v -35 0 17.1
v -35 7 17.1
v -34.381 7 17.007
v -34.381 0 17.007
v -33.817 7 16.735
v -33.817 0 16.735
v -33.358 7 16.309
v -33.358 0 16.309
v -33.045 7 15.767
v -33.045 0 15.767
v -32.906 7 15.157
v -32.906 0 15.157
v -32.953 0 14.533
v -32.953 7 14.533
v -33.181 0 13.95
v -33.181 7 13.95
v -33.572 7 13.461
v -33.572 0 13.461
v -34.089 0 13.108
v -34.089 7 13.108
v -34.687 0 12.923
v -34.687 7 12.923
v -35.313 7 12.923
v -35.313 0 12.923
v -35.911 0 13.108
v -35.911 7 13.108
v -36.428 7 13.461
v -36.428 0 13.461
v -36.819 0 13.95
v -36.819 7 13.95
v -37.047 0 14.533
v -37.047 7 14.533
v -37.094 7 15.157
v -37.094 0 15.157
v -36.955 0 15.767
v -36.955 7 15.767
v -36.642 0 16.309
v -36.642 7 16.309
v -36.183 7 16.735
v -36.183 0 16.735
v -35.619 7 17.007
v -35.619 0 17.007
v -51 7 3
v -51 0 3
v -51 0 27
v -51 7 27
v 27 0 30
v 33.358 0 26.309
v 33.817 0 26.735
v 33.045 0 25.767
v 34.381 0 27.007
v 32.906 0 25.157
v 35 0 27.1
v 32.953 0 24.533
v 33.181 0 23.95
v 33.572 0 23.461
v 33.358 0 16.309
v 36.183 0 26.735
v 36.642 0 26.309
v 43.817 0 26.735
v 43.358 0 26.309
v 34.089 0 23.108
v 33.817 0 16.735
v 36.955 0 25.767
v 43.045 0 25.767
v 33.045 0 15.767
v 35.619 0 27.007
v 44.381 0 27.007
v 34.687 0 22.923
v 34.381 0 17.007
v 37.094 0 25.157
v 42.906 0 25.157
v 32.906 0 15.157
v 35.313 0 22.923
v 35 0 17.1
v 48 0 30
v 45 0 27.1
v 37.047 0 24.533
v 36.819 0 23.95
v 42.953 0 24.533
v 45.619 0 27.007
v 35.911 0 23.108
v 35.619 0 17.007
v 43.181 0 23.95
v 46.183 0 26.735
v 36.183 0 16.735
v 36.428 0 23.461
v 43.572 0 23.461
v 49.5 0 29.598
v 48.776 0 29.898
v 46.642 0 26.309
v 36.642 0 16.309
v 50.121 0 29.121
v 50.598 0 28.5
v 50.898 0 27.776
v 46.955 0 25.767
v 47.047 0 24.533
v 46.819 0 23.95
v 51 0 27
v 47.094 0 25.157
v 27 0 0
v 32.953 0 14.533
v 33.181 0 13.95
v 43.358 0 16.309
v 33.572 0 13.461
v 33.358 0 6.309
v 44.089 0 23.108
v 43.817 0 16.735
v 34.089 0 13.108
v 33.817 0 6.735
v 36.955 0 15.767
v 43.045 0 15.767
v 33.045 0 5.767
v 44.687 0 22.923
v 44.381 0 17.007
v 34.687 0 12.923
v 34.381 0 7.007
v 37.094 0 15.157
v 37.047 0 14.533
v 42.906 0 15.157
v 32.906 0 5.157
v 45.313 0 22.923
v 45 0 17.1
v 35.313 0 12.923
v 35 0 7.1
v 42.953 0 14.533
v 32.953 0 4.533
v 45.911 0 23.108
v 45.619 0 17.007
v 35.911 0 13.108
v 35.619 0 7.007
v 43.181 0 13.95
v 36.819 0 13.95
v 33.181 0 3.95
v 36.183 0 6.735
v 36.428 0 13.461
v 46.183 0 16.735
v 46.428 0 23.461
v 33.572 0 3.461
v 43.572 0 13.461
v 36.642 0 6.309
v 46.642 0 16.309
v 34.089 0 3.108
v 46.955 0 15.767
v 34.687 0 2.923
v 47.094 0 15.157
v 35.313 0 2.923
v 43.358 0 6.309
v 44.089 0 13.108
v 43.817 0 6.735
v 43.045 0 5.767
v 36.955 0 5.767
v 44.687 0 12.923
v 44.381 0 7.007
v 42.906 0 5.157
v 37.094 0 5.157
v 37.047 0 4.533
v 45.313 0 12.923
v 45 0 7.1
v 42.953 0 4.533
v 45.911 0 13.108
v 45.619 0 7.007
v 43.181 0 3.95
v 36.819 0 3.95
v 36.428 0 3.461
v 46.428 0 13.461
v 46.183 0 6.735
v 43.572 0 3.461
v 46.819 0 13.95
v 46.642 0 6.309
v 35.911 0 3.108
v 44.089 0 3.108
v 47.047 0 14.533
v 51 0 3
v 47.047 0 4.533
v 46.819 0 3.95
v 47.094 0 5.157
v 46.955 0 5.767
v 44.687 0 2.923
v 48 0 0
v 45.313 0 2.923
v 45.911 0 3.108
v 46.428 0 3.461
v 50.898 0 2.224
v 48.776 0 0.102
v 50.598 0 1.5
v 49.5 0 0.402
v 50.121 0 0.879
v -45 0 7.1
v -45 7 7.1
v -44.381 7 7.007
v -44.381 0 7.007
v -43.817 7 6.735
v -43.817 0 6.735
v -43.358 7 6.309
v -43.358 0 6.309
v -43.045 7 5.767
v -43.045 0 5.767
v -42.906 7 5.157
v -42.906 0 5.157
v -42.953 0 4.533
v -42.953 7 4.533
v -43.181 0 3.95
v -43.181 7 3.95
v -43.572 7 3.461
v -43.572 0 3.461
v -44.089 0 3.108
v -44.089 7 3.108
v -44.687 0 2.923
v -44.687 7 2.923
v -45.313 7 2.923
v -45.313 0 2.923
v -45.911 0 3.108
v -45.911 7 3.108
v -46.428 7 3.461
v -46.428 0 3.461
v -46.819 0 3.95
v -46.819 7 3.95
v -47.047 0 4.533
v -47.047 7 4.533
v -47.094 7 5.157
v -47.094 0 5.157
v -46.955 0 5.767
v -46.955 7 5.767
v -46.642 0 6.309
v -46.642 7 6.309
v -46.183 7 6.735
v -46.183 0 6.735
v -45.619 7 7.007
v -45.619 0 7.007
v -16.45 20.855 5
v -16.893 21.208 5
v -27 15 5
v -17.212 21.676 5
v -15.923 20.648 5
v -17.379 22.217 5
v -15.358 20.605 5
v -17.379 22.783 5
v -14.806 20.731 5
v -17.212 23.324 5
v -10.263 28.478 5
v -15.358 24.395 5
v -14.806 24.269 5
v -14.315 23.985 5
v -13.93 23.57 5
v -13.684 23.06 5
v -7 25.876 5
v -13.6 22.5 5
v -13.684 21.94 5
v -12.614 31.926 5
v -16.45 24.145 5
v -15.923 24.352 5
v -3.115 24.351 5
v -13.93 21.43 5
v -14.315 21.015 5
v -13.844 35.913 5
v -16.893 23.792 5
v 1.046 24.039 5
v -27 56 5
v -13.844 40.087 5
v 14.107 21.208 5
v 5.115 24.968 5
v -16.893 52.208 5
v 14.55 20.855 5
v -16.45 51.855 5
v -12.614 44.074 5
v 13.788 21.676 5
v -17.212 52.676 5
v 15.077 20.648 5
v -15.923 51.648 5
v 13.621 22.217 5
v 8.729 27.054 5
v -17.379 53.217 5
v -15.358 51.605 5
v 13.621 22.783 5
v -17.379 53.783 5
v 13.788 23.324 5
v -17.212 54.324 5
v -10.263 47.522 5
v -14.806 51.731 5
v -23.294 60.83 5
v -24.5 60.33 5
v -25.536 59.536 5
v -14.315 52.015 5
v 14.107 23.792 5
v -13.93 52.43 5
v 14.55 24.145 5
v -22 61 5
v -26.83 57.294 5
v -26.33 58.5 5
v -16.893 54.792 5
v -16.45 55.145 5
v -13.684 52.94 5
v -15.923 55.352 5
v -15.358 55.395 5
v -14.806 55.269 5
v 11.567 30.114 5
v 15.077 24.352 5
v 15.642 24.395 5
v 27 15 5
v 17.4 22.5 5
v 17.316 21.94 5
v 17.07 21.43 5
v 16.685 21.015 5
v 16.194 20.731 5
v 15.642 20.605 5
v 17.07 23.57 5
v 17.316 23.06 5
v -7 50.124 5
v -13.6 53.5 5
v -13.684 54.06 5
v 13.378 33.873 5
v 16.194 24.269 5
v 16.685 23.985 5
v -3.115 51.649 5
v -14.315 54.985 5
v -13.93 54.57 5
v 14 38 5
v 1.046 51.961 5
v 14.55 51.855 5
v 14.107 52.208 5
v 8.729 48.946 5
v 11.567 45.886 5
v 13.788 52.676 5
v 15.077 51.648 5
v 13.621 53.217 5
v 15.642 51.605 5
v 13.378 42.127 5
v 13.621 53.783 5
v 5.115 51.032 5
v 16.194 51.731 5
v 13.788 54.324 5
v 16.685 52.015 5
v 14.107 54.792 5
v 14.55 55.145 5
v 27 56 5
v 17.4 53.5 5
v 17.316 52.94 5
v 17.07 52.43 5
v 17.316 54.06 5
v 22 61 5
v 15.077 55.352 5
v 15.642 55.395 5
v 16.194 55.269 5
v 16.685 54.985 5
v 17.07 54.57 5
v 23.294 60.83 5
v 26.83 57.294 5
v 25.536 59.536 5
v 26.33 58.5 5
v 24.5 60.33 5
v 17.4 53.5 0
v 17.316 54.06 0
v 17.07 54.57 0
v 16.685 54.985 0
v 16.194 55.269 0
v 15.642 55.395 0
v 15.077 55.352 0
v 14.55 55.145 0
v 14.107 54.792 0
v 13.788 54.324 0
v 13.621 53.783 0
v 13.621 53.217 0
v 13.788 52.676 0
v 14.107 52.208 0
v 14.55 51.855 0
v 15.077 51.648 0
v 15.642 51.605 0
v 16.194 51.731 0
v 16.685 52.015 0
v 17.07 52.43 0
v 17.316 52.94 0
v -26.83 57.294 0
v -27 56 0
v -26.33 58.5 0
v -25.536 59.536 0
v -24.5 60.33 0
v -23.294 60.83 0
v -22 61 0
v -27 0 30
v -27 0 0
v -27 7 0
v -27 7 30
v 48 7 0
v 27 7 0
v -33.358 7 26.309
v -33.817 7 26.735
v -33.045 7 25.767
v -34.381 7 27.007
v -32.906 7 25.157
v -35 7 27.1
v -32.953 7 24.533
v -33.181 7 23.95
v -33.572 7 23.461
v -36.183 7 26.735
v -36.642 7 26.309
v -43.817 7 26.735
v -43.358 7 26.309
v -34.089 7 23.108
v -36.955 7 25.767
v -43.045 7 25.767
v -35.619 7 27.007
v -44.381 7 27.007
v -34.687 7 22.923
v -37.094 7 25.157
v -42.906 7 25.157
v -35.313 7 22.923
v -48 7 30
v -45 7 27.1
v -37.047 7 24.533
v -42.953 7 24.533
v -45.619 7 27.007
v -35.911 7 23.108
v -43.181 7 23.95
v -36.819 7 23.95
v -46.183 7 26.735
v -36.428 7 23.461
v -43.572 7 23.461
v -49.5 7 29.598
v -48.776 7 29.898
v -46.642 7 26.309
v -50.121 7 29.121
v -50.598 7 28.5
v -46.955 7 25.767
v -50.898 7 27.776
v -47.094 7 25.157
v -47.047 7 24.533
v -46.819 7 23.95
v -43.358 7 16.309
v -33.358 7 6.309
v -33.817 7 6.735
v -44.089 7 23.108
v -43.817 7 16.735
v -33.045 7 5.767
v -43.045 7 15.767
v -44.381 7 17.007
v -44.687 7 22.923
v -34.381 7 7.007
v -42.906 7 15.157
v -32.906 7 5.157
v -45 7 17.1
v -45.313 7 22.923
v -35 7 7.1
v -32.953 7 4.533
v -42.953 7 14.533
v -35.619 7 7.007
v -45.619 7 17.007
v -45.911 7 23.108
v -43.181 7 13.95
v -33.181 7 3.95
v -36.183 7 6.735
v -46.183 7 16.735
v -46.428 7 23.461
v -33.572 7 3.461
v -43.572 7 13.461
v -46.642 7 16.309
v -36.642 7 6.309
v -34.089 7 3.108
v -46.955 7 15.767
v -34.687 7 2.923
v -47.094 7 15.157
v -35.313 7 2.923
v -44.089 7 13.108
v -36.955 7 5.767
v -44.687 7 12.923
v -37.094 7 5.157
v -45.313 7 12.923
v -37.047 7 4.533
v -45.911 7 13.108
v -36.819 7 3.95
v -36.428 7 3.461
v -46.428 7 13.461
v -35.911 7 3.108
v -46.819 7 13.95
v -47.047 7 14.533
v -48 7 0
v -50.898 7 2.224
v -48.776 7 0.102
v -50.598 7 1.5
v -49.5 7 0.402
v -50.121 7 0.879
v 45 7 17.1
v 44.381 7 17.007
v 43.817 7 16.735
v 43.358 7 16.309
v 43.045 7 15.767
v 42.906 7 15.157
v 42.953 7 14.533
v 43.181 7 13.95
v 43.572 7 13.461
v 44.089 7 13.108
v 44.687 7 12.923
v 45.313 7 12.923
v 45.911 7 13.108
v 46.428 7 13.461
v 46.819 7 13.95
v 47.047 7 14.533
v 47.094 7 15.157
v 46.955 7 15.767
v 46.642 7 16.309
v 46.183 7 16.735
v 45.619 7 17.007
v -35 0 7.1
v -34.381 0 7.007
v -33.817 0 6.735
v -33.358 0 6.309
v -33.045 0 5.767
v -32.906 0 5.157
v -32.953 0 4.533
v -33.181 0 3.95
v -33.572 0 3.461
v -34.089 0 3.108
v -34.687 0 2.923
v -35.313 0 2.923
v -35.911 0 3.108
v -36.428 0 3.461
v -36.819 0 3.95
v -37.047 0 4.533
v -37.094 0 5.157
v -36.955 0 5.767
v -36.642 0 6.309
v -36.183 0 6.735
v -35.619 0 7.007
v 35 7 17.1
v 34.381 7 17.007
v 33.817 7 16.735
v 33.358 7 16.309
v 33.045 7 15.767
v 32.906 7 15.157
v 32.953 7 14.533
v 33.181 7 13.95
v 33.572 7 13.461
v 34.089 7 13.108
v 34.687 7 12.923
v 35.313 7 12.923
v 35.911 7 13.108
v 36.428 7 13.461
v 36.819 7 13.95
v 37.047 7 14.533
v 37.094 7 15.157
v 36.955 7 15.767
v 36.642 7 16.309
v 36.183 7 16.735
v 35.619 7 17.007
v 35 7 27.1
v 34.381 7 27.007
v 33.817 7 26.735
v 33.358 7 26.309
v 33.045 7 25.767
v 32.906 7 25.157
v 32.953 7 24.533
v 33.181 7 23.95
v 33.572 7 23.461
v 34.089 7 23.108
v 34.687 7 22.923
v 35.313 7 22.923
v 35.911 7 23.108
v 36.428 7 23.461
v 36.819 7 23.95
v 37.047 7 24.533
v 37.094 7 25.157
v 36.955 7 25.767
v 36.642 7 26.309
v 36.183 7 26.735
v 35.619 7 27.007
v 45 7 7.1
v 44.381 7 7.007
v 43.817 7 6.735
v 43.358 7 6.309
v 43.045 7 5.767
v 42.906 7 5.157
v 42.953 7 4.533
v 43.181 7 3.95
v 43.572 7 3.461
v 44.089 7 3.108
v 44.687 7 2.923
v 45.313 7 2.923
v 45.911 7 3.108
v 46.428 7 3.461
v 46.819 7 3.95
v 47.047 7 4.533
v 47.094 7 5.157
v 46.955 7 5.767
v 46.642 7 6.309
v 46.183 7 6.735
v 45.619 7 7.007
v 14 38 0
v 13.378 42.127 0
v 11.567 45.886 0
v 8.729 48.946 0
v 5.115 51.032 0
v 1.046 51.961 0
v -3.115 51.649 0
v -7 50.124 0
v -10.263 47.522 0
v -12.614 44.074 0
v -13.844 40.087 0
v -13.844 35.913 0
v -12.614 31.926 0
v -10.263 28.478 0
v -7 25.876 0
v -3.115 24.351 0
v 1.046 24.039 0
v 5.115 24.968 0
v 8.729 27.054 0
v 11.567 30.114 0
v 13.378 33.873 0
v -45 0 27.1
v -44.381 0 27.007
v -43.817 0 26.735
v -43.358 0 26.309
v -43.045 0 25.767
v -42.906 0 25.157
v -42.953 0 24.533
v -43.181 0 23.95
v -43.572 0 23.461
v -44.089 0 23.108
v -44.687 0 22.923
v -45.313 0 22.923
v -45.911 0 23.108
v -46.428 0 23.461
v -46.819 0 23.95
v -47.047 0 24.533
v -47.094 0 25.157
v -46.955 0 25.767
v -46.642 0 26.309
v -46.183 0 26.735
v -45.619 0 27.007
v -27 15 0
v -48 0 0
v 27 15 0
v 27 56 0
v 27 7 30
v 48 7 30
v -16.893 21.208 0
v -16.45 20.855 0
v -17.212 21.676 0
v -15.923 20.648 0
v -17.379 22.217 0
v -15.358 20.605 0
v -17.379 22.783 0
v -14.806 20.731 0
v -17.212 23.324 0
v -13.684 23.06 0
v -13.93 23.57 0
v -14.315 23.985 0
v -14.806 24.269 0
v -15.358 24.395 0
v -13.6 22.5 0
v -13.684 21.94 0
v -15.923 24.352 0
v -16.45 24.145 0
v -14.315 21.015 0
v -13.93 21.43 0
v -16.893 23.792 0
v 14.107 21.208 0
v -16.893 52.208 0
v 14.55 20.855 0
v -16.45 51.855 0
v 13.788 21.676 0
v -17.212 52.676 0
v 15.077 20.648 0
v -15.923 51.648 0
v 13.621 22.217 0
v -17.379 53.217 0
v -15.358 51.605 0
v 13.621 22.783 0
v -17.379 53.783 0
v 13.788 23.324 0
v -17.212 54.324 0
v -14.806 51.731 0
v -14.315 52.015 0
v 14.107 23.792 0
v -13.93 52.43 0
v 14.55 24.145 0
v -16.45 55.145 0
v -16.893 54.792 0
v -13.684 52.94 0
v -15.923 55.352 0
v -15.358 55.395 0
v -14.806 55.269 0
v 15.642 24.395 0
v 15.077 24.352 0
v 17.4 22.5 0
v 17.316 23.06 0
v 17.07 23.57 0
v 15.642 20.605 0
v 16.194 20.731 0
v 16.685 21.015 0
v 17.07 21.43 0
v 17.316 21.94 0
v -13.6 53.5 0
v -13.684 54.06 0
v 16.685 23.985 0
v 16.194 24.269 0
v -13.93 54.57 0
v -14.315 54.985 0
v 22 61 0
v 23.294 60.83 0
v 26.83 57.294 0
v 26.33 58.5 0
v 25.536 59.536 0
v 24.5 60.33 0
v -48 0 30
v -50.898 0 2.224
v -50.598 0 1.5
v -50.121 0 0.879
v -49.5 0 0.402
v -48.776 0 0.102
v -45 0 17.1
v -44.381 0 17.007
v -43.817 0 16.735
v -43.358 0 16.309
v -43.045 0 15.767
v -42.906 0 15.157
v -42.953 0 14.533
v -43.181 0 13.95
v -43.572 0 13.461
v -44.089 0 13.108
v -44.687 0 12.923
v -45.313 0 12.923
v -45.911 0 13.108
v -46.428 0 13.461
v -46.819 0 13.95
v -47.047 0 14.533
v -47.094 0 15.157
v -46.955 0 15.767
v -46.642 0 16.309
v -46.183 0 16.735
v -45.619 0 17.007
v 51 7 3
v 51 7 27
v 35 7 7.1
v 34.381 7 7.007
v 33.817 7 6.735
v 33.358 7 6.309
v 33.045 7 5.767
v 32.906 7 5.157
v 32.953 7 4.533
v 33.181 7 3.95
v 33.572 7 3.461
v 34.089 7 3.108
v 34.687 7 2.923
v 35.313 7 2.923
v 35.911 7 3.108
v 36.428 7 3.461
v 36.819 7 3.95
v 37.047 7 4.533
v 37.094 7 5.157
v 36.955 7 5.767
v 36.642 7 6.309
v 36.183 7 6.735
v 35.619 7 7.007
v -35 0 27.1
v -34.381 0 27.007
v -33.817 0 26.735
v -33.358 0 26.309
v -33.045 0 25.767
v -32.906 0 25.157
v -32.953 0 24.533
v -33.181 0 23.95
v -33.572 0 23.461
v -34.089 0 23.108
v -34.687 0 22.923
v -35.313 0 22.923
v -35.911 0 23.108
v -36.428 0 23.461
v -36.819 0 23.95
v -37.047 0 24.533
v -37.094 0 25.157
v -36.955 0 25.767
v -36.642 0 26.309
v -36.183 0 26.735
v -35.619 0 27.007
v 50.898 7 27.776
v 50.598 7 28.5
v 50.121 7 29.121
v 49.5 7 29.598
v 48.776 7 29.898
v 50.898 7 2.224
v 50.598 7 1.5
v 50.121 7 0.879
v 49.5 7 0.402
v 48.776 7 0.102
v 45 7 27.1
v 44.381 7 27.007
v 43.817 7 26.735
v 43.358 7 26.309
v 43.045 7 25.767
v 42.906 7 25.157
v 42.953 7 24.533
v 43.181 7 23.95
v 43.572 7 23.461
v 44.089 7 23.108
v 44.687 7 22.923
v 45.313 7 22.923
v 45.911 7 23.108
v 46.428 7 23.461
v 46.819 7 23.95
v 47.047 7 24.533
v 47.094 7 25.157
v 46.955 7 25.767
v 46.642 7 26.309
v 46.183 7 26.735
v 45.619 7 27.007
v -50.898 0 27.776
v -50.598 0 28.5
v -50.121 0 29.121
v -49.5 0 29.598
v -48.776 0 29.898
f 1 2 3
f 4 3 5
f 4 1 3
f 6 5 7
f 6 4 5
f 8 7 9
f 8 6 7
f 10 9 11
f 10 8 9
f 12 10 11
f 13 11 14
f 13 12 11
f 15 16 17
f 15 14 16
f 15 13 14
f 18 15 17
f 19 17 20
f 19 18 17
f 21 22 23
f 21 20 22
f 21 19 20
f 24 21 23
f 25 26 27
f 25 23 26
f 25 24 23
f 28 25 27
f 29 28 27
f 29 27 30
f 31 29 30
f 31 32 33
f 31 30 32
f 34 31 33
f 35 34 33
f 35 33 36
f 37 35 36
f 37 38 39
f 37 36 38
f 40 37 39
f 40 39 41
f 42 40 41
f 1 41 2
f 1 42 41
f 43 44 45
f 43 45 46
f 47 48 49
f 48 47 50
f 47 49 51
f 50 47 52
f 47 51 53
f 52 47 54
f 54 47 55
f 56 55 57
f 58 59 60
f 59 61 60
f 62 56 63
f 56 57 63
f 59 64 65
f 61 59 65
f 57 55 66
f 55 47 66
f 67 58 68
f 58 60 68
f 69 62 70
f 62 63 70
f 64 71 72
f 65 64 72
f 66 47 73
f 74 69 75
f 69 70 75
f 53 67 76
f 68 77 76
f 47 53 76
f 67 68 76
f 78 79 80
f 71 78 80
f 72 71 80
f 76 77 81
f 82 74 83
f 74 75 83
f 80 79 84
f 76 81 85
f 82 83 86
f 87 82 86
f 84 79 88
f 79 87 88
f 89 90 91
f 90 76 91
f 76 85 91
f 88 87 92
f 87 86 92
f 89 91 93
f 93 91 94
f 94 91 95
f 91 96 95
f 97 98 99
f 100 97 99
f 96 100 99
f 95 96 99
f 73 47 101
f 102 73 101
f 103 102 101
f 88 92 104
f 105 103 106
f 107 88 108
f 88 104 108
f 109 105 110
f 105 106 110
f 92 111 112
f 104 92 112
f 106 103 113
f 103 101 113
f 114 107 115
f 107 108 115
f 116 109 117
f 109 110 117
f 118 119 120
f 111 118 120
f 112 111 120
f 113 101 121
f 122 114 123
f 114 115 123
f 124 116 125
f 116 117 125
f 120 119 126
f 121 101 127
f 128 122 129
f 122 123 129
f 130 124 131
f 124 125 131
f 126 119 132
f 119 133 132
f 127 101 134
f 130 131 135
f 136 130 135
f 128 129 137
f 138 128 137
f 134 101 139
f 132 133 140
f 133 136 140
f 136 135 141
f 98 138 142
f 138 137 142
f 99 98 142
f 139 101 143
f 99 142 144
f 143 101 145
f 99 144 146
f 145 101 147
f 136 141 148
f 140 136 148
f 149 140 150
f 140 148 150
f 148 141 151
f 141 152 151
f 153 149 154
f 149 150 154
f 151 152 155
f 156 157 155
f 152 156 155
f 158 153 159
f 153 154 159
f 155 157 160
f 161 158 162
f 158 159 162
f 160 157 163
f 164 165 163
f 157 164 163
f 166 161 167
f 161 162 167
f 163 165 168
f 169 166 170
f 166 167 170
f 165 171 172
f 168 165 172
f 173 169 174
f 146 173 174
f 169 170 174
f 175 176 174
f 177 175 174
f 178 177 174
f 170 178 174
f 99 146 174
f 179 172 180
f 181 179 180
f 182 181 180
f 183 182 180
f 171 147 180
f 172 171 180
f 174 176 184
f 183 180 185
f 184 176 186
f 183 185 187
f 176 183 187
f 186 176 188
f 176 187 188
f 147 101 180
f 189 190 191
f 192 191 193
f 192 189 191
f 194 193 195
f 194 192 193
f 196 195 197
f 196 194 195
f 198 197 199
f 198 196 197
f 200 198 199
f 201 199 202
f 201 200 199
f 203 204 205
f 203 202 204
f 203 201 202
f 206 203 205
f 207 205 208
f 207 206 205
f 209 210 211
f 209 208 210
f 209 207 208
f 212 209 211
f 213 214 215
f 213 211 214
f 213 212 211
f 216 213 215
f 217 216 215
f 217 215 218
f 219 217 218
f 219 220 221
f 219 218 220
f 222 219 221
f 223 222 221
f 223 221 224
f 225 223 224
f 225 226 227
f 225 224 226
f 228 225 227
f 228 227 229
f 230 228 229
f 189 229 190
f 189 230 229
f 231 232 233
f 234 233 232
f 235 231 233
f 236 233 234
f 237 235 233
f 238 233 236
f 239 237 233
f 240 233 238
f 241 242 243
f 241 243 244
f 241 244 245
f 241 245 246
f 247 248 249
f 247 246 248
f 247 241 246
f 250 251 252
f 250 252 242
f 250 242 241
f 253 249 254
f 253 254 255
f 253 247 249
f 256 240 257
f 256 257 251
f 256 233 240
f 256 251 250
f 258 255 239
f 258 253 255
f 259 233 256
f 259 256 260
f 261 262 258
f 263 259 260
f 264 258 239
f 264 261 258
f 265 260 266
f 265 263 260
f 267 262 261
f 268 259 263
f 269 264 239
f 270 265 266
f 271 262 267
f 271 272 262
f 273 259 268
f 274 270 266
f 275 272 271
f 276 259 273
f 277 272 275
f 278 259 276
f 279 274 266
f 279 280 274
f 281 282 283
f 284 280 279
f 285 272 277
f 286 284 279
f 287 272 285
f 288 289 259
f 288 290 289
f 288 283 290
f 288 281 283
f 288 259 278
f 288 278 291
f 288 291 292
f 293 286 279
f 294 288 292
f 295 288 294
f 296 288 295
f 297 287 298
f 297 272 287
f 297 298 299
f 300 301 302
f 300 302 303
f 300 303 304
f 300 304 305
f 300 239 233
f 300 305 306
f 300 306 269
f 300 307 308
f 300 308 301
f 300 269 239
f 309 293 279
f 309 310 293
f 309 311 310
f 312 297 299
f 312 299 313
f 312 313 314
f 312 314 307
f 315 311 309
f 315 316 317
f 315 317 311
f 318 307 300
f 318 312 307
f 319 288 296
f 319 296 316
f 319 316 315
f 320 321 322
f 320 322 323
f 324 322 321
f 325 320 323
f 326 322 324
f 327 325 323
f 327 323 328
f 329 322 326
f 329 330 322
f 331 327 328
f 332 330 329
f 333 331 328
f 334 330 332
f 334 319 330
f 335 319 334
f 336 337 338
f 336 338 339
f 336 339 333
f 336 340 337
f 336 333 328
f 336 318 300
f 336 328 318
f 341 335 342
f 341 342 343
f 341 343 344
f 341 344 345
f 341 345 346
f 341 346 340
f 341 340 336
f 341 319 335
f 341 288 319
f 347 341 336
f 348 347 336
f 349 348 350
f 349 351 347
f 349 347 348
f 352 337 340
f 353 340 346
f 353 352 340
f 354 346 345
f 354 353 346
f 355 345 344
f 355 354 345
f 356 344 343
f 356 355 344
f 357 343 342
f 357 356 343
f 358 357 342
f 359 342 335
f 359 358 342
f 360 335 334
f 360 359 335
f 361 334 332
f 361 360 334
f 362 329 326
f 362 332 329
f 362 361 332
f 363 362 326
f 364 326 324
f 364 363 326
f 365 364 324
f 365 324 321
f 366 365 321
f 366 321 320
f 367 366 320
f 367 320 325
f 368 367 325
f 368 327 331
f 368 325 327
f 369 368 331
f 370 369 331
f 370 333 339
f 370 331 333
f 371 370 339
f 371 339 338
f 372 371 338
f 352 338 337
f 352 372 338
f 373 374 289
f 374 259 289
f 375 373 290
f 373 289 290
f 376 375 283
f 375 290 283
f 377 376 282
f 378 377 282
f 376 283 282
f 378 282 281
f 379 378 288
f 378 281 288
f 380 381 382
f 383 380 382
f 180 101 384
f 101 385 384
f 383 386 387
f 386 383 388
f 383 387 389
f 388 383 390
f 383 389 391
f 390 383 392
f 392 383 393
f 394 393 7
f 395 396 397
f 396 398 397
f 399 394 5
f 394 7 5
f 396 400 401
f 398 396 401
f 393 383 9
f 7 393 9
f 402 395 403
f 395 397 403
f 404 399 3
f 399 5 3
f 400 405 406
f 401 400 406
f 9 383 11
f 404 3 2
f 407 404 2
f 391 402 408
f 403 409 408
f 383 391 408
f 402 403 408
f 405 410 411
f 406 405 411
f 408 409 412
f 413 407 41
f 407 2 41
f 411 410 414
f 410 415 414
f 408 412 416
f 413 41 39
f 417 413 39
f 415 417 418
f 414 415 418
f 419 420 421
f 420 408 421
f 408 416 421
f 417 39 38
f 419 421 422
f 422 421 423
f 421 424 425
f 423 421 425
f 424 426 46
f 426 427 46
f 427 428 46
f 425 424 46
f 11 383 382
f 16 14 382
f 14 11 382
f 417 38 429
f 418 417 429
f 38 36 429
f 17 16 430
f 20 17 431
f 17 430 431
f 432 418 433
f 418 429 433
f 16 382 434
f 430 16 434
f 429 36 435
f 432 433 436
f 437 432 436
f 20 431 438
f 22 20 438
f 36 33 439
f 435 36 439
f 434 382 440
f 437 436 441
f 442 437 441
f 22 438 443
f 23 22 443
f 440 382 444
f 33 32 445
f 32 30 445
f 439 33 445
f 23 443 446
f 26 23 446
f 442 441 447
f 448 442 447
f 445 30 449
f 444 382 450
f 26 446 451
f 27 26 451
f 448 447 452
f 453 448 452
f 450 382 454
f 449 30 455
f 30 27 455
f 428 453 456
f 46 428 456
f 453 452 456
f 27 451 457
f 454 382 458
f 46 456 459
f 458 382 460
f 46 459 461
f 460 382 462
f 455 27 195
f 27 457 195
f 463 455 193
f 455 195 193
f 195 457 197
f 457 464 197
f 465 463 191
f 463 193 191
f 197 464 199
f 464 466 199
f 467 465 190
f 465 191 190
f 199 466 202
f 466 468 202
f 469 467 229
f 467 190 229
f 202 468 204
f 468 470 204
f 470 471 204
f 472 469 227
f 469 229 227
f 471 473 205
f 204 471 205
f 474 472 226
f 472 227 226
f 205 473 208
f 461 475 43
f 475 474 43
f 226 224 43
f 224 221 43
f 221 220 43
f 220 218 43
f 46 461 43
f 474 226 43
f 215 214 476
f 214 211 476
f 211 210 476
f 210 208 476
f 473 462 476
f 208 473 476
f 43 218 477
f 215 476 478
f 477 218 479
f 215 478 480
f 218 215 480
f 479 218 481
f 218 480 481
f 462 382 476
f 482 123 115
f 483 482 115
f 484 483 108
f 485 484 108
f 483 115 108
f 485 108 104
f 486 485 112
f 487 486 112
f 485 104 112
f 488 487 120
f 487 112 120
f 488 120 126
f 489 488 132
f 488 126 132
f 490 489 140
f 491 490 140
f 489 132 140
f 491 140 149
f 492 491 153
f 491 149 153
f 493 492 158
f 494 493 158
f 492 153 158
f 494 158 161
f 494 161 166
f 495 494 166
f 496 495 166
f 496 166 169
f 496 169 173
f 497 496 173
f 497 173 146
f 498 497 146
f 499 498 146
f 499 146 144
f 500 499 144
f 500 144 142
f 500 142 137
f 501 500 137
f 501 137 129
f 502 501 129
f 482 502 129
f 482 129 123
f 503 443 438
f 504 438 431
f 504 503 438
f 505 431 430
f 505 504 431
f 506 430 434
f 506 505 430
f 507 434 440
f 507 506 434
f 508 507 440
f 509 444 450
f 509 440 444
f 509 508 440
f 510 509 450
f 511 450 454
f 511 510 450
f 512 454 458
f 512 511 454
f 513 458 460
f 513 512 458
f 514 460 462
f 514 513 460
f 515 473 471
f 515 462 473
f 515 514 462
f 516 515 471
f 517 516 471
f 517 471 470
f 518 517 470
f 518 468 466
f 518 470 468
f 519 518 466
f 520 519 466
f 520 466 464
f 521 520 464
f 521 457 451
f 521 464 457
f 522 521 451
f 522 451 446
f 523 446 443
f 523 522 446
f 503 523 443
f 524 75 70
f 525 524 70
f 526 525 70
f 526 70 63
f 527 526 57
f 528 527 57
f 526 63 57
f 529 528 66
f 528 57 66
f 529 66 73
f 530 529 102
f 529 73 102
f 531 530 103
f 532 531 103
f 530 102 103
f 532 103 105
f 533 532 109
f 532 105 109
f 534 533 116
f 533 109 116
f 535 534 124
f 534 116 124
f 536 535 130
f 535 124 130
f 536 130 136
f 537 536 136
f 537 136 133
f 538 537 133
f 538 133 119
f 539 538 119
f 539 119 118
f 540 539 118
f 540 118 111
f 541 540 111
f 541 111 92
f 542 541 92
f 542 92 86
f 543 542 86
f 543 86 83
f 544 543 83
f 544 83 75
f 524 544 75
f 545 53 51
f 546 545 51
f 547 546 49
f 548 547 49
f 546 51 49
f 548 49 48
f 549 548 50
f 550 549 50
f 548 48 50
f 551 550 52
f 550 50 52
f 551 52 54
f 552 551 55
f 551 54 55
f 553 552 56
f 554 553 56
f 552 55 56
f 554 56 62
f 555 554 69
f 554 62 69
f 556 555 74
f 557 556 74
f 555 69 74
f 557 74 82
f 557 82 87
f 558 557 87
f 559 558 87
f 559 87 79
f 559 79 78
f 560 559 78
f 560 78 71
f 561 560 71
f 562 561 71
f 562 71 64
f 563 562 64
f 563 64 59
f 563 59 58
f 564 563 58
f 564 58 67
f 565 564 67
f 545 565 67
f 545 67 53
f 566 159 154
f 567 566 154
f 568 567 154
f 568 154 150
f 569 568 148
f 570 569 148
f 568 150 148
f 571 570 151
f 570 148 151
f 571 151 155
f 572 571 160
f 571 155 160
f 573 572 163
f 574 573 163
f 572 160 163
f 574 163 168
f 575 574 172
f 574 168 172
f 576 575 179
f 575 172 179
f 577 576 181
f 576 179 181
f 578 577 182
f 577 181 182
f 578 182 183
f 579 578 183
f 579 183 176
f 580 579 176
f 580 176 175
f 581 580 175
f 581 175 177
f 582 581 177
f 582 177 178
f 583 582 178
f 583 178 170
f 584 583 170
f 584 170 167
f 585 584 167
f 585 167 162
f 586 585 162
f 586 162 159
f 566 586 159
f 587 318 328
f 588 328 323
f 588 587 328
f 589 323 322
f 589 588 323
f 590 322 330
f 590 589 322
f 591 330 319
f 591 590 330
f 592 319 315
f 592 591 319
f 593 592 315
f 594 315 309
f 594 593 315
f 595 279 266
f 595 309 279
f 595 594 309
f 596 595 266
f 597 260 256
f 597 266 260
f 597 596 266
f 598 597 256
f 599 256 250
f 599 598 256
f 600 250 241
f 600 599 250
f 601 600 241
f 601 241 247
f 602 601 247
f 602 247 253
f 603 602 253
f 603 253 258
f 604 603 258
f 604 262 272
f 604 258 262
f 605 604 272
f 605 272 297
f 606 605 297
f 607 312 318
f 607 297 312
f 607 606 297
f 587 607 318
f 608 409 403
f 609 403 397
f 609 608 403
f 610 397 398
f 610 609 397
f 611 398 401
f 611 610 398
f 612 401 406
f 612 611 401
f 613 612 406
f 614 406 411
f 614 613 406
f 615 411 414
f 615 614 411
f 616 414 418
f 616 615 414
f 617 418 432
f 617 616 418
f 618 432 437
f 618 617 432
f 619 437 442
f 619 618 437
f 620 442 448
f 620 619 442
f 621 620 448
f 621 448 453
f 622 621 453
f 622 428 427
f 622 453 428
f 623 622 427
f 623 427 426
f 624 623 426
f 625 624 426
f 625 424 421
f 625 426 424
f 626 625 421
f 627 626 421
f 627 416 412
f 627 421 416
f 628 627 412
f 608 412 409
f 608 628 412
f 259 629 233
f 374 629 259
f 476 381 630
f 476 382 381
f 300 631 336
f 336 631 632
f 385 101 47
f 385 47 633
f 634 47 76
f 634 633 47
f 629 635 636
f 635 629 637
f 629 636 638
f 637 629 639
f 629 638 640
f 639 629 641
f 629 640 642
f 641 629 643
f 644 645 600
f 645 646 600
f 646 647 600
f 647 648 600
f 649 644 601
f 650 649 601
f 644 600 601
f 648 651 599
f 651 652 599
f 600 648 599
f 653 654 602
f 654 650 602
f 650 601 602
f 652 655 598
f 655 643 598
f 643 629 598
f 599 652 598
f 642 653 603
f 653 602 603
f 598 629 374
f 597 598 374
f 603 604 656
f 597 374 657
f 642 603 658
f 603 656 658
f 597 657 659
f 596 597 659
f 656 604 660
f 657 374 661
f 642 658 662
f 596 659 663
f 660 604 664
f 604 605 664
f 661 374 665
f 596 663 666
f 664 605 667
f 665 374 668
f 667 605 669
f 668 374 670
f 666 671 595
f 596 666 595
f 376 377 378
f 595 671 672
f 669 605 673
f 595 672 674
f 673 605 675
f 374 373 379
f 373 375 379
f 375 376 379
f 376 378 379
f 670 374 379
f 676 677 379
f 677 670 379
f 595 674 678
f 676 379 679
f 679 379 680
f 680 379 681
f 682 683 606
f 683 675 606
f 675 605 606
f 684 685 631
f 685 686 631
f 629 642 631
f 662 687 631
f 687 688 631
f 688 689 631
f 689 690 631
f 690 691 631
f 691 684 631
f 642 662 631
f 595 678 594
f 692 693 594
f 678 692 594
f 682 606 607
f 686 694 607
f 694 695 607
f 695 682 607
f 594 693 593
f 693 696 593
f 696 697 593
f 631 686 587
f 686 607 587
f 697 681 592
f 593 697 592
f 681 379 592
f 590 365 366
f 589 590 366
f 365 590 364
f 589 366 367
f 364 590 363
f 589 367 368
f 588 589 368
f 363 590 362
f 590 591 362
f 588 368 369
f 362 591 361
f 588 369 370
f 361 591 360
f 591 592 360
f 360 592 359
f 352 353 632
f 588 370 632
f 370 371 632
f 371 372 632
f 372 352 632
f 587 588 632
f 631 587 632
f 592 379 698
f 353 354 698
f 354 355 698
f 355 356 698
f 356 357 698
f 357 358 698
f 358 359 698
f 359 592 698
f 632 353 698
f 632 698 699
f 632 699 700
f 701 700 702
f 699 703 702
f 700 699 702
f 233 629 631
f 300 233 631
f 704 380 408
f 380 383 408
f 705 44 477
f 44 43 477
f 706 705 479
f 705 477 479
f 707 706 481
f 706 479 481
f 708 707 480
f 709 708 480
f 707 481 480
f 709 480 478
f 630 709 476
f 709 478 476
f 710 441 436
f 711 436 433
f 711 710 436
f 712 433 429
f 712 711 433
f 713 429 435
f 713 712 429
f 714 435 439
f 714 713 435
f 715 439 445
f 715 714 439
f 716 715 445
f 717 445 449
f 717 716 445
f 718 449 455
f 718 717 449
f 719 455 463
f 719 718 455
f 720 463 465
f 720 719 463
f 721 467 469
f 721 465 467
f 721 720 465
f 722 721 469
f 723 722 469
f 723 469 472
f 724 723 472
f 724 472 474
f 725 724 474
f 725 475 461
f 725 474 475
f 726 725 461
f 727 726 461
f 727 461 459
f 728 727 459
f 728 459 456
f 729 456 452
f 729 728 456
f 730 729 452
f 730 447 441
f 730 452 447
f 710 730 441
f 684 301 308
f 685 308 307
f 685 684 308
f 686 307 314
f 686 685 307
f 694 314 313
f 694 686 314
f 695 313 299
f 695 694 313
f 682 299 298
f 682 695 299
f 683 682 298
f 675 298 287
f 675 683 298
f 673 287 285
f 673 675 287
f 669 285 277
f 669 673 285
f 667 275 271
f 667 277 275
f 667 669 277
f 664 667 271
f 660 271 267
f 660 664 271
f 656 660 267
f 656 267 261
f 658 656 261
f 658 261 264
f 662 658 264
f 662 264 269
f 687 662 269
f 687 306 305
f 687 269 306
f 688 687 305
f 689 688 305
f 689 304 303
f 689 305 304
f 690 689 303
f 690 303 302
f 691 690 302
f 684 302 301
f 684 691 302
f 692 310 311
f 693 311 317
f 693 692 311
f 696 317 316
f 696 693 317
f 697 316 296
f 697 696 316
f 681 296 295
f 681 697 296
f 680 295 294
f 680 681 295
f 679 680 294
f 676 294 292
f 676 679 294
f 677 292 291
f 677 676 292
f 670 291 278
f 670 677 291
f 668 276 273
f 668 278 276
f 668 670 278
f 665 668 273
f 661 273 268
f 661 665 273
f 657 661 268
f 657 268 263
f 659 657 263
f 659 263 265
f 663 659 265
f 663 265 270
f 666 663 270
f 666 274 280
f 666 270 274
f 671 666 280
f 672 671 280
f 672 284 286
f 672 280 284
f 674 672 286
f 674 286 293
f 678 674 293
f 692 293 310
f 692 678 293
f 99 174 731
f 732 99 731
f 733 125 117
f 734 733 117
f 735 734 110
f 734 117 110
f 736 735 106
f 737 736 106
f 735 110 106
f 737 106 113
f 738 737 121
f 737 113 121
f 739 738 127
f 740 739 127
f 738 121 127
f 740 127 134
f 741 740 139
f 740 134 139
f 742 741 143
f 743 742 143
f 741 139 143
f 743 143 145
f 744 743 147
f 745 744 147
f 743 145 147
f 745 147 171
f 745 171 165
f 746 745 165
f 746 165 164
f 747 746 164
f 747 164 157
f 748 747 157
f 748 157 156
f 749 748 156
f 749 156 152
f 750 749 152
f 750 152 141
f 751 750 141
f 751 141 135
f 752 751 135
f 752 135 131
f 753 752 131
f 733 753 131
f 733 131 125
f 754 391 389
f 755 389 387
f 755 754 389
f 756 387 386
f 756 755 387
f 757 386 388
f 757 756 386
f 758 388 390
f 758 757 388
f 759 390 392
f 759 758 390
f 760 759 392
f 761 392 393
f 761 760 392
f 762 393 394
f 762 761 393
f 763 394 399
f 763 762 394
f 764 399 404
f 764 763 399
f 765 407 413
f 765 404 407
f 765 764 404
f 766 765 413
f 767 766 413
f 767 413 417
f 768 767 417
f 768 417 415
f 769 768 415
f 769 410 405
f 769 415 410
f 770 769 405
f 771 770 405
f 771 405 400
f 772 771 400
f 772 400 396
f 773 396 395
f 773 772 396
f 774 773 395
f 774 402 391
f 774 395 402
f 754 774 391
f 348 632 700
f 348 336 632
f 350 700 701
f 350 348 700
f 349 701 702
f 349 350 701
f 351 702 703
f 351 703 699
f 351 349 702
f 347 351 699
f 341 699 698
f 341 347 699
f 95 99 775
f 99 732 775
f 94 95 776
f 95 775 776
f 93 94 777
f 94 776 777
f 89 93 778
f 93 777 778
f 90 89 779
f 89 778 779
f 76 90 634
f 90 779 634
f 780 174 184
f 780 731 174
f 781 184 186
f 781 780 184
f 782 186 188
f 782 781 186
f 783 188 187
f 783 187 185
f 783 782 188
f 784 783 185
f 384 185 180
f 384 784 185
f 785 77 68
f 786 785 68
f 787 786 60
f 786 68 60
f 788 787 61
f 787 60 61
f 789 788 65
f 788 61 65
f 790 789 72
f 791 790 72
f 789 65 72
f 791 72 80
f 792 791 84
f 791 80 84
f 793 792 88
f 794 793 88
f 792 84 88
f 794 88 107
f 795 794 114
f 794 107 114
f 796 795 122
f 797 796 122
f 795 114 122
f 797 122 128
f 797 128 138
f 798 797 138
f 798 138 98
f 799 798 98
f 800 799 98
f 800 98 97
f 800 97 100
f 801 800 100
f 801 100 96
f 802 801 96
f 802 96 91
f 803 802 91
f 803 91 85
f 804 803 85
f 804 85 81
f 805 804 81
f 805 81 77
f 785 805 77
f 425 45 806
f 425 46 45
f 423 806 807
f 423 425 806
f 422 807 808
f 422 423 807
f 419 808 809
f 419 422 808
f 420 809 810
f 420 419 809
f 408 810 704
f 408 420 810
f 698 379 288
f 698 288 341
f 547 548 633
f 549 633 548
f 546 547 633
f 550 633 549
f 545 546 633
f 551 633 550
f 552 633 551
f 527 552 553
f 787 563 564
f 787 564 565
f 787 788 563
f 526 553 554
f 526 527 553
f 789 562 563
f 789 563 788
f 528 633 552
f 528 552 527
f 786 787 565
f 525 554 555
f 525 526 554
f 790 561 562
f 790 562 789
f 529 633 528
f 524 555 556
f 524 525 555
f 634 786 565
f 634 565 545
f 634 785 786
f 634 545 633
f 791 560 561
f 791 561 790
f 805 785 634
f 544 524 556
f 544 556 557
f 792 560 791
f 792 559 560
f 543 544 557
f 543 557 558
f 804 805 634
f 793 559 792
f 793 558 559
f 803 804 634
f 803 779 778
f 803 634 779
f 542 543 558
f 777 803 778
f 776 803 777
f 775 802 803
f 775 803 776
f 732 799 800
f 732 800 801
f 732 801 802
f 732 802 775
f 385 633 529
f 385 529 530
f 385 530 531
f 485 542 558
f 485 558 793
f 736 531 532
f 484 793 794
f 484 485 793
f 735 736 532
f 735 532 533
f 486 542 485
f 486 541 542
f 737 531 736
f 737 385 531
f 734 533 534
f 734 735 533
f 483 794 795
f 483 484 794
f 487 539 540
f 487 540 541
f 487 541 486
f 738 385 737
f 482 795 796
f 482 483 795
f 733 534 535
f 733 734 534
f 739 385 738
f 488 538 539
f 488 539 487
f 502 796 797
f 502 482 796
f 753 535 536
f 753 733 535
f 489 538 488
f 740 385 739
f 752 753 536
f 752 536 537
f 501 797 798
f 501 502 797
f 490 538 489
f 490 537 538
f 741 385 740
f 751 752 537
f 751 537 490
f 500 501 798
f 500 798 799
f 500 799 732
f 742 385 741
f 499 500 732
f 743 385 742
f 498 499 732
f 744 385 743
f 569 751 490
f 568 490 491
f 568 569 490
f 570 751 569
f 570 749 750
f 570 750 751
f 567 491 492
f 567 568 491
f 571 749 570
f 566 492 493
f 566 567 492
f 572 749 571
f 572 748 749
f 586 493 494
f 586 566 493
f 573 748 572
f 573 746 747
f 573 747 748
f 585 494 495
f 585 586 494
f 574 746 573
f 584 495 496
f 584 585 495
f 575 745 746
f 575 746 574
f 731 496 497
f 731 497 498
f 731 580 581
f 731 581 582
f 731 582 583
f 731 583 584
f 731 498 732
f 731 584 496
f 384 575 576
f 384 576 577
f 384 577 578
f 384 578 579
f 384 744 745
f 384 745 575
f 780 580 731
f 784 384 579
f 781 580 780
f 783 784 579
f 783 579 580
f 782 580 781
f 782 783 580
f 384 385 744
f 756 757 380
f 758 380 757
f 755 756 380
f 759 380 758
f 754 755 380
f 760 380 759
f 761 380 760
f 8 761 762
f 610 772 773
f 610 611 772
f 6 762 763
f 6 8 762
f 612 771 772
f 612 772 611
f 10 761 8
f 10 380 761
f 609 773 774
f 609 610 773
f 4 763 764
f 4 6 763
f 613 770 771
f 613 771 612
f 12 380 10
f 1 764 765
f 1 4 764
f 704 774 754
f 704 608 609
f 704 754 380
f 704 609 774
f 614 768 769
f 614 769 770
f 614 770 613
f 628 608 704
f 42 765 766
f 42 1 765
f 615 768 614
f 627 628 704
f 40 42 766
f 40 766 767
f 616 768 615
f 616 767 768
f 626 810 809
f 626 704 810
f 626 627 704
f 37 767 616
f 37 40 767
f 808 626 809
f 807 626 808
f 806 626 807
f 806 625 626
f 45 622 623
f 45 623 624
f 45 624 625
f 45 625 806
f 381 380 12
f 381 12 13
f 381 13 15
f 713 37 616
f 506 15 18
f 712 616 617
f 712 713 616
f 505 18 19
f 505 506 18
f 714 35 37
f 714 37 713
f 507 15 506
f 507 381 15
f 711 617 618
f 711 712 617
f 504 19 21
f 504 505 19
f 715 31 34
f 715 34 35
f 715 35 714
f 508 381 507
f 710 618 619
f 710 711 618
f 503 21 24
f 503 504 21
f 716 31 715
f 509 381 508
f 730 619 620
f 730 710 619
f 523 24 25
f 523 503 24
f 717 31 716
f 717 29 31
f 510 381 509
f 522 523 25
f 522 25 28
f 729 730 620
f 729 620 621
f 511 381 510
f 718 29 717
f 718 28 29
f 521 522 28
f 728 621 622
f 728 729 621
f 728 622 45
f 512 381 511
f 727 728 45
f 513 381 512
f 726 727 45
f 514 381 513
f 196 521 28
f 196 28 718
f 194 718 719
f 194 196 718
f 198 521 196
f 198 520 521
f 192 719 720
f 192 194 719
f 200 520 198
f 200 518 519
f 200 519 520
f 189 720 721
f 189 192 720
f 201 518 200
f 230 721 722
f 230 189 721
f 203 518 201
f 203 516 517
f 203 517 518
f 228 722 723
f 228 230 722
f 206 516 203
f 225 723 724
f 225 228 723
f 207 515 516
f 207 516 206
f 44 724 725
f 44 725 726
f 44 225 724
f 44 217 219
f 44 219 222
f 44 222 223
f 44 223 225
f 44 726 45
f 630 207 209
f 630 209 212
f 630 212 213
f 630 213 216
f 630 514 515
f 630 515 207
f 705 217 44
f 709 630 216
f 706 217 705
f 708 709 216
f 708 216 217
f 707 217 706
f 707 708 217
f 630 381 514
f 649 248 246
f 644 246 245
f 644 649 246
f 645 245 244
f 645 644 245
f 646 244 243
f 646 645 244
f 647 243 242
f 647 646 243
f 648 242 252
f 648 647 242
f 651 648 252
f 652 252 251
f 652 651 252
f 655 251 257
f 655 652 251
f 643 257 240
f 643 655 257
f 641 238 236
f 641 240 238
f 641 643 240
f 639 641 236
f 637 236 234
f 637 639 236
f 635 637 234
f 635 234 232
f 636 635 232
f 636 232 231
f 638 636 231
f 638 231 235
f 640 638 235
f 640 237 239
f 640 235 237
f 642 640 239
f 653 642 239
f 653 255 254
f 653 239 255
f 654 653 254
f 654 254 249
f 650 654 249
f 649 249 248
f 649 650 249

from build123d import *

# Parameters (mm, degrees)
CYLINDER006_R        = 1.9
CYLINDER006_DEPTH    = 10
ARRAY_X_COUNT        = 2
ARRAY_X_PITCH        = 31
ARRAY_Y_COUNT        = 2
ARRAY_Y_PITCH        = 31
CYLINDER009_R        = 2.1
CYLINDER009_DEPTH    = 10
ARRAY002_X_COUNT     = 3
ARRAY002_X_PITCH     = 10
ARRAY002_Y_COUNT     = 2
ARRAY002_Y_PITCH     = 10
BODY_PITCH_ANGLE     = -90
BODY_PLACEMENT_ANGLE = -90
CYLINDER005_R        = 14
CYLINDER005_DEPTH    = 20
BOX004_W             = 24
BOX004_H             = 7
BOX004_DEPTH         = 30
FILLET004_R          = 3
BOX003_W             = 54
BOX003_H             = 46
BOX003_DEPTH         = 5
FILLET001_R          = 5


with BuildPart() as stepper_bolt_hole_array:
    # Cylinder006 → Cylinder006 (new body)
    with BuildSketch(Plane(origin=(0, 38, 0), x_dir=(1, 0, 0), z_dir=(0, 0, 1))):
        Circle(CYLINDER006_R)
    extrude(amount=CYLINDER006_DEPTH)

    # Array X: stepper bolt hole array ×2


with BuildPart() as stepper_bolt_hole_array_1:
    add(stepper_bolt_hole_array.part)
    with Locations(*[(i * ARRAY_X_PITCH, 0, 0) for i in range(1, ARRAY_X_COUNT)]):
        add(stepper_bolt_hole_array.part)

    # Array Y: stepper bolt hole array ×2


with BuildPart() as stepper_bolt_hole_array_2:
    add(stepper_bolt_hole_array_1.part)
    with Locations(*[(0, i * ARRAY_Y_PITCH, 0) for i in range(1, ARRAY_Y_COUNT)]):
        add(stepper_bolt_hole_array_1.part)


with BuildPart() as stepper_bolt_hole_array_3:
    # Array placement: moved
    add(stepper_bolt_hole_array_2.part.moved(Location((-15.5, -15.5, 0))))


with BuildPart() as holdert_hole_clone:
    # Cylinder009 → Cylinder009 (new body)
    with BuildSketch(Plane.XY):
        Circle(CYLINDER009_R)
    extrude(amount=CYLINDER009_DEPTH)

    # Array002 X: holdert hole clone ×3


with BuildPart() as holdert_hole_clone_1:
    add(holdert_hole_clone.part)
    with Locations(*[(i * ARRAY002_X_PITCH, 0, 0) for i in range(1, ARRAY002_X_COUNT)]):
        add(holdert_hole_clone.part)

    # Array002 Y: holdert hole clone ×2


with BuildPart() as holdert_hole_clone_2:
    add(holdert_hole_clone_1.part)
    with Locations(*[(0, i * ARRAY002_Y_PITCH, 0) for i in range(1, ARRAY002_Y_COUNT)]):
        add(holdert_hole_clone_1.part)


with BuildPart() as holdert_hole_clone_3:
    # Body pitch: moved
    add(holdert_hole_clone_2.part.rotate(Axis((0, 0, 0), (0, 1, 0)), BODY_PITCH_ANGLE))


with BuildPart() as holdert_hole_clone_4:
    # Body placement: moved
    add(holdert_hole_clone_3.part.moved(Location((-45, 0, 5))).rotate(Axis((-45, 0, 5), (0, 0, 1)), BODY_PLACEMENT_ANGLE))


with BuildPart() as part_mirroring005:
    # Part__Mirroring005: instance of holdert hole clone
    add(holdert_hole_clone_4.part.mirror(Plane(origin=(0, 0, 0), x_dir=(0, -1, 0), z_dir=(1, 0, 0))))


with BuildPart() as stepper_wall_extract_fusion:
    # Cylinder005 → Cylinder005 (new body)
    with BuildSketch(Plane(origin=(0, 38, 0), x_dir=(1, 0, 0), z_dir=(0, 0, 1))):
        Circle(CYLINDER005_R)
    extrude(amount=CYLINDER005_DEPTH)

    # Fusion006: union stepper bolt hole array, Part__Mirroring005, holdert hole clone
    add(stepper_bolt_hole_array_3.part)
    add(part_mirroring005.part)
    add(holdert_hole_clone_4.part)


with BuildPart() as stepper_top_wall_fillet:
    # Box004 → Box004 (new body)
    with BuildSketch(Plane(origin=(27, 0, 0), x_dir=(1, 0, 0), z_dir=(0, 0, 1))):
        with Locations((12, 3.5)):
            Rectangle(BOX004_W, BOX004_H)
    extrude(amount=BOX004_DEPTH)

    # Fillet004
    fillet004_edges = [stepper_top_wall_fillet.edges().sort_by_distance(p)[0] for p in [
        (51, 3.5, 30),
        (51, 3.5, 0),
    ]]
    fillet(fillet004_edges, radius=FILLET004_R)


with BuildPart() as part_mirroring003:
    # Part__Mirroring003: instance of stepper top wall fillet
    add(stepper_top_wall_fillet.part.mirror(Plane(origin=(0, 0, 0), x_dir=(0, -1, 0), z_dir=(1, 0, 0))))


with BuildPart() as stepper_wall_cut:
    # Box003 → Box003 (new body)
    with BuildSketch(Plane(origin=(-27, 15, 0), x_dir=(1, 0, 0), z_dir=(0, 0, 1))):
        with Locations((27, 23)):
            Rectangle(BOX003_W, BOX003_H)
    extrude(amount=BOX003_DEPTH)

    # Fillet001
    fillet001_edges = [stepper_wall_cut.edges().sort_by_distance(p)[0] for p in [
        (-27, 61, 2.5),
        (27, 61, 2.5),
    ]]
    fillet(fillet001_edges, radius=FILLET001_R)

    # Fusion007: union stepper top wall fillet, Part__Mirroring003
    add(stepper_top_wall_fillet.part)
    add(part_mirroring003.part)

    # Cut003: cut stepper wall extract fusion
    add(stepper_wall_extract_fusion.part, mode=Mode.SUBTRACT)


solid = stepper_wall_cut.part
